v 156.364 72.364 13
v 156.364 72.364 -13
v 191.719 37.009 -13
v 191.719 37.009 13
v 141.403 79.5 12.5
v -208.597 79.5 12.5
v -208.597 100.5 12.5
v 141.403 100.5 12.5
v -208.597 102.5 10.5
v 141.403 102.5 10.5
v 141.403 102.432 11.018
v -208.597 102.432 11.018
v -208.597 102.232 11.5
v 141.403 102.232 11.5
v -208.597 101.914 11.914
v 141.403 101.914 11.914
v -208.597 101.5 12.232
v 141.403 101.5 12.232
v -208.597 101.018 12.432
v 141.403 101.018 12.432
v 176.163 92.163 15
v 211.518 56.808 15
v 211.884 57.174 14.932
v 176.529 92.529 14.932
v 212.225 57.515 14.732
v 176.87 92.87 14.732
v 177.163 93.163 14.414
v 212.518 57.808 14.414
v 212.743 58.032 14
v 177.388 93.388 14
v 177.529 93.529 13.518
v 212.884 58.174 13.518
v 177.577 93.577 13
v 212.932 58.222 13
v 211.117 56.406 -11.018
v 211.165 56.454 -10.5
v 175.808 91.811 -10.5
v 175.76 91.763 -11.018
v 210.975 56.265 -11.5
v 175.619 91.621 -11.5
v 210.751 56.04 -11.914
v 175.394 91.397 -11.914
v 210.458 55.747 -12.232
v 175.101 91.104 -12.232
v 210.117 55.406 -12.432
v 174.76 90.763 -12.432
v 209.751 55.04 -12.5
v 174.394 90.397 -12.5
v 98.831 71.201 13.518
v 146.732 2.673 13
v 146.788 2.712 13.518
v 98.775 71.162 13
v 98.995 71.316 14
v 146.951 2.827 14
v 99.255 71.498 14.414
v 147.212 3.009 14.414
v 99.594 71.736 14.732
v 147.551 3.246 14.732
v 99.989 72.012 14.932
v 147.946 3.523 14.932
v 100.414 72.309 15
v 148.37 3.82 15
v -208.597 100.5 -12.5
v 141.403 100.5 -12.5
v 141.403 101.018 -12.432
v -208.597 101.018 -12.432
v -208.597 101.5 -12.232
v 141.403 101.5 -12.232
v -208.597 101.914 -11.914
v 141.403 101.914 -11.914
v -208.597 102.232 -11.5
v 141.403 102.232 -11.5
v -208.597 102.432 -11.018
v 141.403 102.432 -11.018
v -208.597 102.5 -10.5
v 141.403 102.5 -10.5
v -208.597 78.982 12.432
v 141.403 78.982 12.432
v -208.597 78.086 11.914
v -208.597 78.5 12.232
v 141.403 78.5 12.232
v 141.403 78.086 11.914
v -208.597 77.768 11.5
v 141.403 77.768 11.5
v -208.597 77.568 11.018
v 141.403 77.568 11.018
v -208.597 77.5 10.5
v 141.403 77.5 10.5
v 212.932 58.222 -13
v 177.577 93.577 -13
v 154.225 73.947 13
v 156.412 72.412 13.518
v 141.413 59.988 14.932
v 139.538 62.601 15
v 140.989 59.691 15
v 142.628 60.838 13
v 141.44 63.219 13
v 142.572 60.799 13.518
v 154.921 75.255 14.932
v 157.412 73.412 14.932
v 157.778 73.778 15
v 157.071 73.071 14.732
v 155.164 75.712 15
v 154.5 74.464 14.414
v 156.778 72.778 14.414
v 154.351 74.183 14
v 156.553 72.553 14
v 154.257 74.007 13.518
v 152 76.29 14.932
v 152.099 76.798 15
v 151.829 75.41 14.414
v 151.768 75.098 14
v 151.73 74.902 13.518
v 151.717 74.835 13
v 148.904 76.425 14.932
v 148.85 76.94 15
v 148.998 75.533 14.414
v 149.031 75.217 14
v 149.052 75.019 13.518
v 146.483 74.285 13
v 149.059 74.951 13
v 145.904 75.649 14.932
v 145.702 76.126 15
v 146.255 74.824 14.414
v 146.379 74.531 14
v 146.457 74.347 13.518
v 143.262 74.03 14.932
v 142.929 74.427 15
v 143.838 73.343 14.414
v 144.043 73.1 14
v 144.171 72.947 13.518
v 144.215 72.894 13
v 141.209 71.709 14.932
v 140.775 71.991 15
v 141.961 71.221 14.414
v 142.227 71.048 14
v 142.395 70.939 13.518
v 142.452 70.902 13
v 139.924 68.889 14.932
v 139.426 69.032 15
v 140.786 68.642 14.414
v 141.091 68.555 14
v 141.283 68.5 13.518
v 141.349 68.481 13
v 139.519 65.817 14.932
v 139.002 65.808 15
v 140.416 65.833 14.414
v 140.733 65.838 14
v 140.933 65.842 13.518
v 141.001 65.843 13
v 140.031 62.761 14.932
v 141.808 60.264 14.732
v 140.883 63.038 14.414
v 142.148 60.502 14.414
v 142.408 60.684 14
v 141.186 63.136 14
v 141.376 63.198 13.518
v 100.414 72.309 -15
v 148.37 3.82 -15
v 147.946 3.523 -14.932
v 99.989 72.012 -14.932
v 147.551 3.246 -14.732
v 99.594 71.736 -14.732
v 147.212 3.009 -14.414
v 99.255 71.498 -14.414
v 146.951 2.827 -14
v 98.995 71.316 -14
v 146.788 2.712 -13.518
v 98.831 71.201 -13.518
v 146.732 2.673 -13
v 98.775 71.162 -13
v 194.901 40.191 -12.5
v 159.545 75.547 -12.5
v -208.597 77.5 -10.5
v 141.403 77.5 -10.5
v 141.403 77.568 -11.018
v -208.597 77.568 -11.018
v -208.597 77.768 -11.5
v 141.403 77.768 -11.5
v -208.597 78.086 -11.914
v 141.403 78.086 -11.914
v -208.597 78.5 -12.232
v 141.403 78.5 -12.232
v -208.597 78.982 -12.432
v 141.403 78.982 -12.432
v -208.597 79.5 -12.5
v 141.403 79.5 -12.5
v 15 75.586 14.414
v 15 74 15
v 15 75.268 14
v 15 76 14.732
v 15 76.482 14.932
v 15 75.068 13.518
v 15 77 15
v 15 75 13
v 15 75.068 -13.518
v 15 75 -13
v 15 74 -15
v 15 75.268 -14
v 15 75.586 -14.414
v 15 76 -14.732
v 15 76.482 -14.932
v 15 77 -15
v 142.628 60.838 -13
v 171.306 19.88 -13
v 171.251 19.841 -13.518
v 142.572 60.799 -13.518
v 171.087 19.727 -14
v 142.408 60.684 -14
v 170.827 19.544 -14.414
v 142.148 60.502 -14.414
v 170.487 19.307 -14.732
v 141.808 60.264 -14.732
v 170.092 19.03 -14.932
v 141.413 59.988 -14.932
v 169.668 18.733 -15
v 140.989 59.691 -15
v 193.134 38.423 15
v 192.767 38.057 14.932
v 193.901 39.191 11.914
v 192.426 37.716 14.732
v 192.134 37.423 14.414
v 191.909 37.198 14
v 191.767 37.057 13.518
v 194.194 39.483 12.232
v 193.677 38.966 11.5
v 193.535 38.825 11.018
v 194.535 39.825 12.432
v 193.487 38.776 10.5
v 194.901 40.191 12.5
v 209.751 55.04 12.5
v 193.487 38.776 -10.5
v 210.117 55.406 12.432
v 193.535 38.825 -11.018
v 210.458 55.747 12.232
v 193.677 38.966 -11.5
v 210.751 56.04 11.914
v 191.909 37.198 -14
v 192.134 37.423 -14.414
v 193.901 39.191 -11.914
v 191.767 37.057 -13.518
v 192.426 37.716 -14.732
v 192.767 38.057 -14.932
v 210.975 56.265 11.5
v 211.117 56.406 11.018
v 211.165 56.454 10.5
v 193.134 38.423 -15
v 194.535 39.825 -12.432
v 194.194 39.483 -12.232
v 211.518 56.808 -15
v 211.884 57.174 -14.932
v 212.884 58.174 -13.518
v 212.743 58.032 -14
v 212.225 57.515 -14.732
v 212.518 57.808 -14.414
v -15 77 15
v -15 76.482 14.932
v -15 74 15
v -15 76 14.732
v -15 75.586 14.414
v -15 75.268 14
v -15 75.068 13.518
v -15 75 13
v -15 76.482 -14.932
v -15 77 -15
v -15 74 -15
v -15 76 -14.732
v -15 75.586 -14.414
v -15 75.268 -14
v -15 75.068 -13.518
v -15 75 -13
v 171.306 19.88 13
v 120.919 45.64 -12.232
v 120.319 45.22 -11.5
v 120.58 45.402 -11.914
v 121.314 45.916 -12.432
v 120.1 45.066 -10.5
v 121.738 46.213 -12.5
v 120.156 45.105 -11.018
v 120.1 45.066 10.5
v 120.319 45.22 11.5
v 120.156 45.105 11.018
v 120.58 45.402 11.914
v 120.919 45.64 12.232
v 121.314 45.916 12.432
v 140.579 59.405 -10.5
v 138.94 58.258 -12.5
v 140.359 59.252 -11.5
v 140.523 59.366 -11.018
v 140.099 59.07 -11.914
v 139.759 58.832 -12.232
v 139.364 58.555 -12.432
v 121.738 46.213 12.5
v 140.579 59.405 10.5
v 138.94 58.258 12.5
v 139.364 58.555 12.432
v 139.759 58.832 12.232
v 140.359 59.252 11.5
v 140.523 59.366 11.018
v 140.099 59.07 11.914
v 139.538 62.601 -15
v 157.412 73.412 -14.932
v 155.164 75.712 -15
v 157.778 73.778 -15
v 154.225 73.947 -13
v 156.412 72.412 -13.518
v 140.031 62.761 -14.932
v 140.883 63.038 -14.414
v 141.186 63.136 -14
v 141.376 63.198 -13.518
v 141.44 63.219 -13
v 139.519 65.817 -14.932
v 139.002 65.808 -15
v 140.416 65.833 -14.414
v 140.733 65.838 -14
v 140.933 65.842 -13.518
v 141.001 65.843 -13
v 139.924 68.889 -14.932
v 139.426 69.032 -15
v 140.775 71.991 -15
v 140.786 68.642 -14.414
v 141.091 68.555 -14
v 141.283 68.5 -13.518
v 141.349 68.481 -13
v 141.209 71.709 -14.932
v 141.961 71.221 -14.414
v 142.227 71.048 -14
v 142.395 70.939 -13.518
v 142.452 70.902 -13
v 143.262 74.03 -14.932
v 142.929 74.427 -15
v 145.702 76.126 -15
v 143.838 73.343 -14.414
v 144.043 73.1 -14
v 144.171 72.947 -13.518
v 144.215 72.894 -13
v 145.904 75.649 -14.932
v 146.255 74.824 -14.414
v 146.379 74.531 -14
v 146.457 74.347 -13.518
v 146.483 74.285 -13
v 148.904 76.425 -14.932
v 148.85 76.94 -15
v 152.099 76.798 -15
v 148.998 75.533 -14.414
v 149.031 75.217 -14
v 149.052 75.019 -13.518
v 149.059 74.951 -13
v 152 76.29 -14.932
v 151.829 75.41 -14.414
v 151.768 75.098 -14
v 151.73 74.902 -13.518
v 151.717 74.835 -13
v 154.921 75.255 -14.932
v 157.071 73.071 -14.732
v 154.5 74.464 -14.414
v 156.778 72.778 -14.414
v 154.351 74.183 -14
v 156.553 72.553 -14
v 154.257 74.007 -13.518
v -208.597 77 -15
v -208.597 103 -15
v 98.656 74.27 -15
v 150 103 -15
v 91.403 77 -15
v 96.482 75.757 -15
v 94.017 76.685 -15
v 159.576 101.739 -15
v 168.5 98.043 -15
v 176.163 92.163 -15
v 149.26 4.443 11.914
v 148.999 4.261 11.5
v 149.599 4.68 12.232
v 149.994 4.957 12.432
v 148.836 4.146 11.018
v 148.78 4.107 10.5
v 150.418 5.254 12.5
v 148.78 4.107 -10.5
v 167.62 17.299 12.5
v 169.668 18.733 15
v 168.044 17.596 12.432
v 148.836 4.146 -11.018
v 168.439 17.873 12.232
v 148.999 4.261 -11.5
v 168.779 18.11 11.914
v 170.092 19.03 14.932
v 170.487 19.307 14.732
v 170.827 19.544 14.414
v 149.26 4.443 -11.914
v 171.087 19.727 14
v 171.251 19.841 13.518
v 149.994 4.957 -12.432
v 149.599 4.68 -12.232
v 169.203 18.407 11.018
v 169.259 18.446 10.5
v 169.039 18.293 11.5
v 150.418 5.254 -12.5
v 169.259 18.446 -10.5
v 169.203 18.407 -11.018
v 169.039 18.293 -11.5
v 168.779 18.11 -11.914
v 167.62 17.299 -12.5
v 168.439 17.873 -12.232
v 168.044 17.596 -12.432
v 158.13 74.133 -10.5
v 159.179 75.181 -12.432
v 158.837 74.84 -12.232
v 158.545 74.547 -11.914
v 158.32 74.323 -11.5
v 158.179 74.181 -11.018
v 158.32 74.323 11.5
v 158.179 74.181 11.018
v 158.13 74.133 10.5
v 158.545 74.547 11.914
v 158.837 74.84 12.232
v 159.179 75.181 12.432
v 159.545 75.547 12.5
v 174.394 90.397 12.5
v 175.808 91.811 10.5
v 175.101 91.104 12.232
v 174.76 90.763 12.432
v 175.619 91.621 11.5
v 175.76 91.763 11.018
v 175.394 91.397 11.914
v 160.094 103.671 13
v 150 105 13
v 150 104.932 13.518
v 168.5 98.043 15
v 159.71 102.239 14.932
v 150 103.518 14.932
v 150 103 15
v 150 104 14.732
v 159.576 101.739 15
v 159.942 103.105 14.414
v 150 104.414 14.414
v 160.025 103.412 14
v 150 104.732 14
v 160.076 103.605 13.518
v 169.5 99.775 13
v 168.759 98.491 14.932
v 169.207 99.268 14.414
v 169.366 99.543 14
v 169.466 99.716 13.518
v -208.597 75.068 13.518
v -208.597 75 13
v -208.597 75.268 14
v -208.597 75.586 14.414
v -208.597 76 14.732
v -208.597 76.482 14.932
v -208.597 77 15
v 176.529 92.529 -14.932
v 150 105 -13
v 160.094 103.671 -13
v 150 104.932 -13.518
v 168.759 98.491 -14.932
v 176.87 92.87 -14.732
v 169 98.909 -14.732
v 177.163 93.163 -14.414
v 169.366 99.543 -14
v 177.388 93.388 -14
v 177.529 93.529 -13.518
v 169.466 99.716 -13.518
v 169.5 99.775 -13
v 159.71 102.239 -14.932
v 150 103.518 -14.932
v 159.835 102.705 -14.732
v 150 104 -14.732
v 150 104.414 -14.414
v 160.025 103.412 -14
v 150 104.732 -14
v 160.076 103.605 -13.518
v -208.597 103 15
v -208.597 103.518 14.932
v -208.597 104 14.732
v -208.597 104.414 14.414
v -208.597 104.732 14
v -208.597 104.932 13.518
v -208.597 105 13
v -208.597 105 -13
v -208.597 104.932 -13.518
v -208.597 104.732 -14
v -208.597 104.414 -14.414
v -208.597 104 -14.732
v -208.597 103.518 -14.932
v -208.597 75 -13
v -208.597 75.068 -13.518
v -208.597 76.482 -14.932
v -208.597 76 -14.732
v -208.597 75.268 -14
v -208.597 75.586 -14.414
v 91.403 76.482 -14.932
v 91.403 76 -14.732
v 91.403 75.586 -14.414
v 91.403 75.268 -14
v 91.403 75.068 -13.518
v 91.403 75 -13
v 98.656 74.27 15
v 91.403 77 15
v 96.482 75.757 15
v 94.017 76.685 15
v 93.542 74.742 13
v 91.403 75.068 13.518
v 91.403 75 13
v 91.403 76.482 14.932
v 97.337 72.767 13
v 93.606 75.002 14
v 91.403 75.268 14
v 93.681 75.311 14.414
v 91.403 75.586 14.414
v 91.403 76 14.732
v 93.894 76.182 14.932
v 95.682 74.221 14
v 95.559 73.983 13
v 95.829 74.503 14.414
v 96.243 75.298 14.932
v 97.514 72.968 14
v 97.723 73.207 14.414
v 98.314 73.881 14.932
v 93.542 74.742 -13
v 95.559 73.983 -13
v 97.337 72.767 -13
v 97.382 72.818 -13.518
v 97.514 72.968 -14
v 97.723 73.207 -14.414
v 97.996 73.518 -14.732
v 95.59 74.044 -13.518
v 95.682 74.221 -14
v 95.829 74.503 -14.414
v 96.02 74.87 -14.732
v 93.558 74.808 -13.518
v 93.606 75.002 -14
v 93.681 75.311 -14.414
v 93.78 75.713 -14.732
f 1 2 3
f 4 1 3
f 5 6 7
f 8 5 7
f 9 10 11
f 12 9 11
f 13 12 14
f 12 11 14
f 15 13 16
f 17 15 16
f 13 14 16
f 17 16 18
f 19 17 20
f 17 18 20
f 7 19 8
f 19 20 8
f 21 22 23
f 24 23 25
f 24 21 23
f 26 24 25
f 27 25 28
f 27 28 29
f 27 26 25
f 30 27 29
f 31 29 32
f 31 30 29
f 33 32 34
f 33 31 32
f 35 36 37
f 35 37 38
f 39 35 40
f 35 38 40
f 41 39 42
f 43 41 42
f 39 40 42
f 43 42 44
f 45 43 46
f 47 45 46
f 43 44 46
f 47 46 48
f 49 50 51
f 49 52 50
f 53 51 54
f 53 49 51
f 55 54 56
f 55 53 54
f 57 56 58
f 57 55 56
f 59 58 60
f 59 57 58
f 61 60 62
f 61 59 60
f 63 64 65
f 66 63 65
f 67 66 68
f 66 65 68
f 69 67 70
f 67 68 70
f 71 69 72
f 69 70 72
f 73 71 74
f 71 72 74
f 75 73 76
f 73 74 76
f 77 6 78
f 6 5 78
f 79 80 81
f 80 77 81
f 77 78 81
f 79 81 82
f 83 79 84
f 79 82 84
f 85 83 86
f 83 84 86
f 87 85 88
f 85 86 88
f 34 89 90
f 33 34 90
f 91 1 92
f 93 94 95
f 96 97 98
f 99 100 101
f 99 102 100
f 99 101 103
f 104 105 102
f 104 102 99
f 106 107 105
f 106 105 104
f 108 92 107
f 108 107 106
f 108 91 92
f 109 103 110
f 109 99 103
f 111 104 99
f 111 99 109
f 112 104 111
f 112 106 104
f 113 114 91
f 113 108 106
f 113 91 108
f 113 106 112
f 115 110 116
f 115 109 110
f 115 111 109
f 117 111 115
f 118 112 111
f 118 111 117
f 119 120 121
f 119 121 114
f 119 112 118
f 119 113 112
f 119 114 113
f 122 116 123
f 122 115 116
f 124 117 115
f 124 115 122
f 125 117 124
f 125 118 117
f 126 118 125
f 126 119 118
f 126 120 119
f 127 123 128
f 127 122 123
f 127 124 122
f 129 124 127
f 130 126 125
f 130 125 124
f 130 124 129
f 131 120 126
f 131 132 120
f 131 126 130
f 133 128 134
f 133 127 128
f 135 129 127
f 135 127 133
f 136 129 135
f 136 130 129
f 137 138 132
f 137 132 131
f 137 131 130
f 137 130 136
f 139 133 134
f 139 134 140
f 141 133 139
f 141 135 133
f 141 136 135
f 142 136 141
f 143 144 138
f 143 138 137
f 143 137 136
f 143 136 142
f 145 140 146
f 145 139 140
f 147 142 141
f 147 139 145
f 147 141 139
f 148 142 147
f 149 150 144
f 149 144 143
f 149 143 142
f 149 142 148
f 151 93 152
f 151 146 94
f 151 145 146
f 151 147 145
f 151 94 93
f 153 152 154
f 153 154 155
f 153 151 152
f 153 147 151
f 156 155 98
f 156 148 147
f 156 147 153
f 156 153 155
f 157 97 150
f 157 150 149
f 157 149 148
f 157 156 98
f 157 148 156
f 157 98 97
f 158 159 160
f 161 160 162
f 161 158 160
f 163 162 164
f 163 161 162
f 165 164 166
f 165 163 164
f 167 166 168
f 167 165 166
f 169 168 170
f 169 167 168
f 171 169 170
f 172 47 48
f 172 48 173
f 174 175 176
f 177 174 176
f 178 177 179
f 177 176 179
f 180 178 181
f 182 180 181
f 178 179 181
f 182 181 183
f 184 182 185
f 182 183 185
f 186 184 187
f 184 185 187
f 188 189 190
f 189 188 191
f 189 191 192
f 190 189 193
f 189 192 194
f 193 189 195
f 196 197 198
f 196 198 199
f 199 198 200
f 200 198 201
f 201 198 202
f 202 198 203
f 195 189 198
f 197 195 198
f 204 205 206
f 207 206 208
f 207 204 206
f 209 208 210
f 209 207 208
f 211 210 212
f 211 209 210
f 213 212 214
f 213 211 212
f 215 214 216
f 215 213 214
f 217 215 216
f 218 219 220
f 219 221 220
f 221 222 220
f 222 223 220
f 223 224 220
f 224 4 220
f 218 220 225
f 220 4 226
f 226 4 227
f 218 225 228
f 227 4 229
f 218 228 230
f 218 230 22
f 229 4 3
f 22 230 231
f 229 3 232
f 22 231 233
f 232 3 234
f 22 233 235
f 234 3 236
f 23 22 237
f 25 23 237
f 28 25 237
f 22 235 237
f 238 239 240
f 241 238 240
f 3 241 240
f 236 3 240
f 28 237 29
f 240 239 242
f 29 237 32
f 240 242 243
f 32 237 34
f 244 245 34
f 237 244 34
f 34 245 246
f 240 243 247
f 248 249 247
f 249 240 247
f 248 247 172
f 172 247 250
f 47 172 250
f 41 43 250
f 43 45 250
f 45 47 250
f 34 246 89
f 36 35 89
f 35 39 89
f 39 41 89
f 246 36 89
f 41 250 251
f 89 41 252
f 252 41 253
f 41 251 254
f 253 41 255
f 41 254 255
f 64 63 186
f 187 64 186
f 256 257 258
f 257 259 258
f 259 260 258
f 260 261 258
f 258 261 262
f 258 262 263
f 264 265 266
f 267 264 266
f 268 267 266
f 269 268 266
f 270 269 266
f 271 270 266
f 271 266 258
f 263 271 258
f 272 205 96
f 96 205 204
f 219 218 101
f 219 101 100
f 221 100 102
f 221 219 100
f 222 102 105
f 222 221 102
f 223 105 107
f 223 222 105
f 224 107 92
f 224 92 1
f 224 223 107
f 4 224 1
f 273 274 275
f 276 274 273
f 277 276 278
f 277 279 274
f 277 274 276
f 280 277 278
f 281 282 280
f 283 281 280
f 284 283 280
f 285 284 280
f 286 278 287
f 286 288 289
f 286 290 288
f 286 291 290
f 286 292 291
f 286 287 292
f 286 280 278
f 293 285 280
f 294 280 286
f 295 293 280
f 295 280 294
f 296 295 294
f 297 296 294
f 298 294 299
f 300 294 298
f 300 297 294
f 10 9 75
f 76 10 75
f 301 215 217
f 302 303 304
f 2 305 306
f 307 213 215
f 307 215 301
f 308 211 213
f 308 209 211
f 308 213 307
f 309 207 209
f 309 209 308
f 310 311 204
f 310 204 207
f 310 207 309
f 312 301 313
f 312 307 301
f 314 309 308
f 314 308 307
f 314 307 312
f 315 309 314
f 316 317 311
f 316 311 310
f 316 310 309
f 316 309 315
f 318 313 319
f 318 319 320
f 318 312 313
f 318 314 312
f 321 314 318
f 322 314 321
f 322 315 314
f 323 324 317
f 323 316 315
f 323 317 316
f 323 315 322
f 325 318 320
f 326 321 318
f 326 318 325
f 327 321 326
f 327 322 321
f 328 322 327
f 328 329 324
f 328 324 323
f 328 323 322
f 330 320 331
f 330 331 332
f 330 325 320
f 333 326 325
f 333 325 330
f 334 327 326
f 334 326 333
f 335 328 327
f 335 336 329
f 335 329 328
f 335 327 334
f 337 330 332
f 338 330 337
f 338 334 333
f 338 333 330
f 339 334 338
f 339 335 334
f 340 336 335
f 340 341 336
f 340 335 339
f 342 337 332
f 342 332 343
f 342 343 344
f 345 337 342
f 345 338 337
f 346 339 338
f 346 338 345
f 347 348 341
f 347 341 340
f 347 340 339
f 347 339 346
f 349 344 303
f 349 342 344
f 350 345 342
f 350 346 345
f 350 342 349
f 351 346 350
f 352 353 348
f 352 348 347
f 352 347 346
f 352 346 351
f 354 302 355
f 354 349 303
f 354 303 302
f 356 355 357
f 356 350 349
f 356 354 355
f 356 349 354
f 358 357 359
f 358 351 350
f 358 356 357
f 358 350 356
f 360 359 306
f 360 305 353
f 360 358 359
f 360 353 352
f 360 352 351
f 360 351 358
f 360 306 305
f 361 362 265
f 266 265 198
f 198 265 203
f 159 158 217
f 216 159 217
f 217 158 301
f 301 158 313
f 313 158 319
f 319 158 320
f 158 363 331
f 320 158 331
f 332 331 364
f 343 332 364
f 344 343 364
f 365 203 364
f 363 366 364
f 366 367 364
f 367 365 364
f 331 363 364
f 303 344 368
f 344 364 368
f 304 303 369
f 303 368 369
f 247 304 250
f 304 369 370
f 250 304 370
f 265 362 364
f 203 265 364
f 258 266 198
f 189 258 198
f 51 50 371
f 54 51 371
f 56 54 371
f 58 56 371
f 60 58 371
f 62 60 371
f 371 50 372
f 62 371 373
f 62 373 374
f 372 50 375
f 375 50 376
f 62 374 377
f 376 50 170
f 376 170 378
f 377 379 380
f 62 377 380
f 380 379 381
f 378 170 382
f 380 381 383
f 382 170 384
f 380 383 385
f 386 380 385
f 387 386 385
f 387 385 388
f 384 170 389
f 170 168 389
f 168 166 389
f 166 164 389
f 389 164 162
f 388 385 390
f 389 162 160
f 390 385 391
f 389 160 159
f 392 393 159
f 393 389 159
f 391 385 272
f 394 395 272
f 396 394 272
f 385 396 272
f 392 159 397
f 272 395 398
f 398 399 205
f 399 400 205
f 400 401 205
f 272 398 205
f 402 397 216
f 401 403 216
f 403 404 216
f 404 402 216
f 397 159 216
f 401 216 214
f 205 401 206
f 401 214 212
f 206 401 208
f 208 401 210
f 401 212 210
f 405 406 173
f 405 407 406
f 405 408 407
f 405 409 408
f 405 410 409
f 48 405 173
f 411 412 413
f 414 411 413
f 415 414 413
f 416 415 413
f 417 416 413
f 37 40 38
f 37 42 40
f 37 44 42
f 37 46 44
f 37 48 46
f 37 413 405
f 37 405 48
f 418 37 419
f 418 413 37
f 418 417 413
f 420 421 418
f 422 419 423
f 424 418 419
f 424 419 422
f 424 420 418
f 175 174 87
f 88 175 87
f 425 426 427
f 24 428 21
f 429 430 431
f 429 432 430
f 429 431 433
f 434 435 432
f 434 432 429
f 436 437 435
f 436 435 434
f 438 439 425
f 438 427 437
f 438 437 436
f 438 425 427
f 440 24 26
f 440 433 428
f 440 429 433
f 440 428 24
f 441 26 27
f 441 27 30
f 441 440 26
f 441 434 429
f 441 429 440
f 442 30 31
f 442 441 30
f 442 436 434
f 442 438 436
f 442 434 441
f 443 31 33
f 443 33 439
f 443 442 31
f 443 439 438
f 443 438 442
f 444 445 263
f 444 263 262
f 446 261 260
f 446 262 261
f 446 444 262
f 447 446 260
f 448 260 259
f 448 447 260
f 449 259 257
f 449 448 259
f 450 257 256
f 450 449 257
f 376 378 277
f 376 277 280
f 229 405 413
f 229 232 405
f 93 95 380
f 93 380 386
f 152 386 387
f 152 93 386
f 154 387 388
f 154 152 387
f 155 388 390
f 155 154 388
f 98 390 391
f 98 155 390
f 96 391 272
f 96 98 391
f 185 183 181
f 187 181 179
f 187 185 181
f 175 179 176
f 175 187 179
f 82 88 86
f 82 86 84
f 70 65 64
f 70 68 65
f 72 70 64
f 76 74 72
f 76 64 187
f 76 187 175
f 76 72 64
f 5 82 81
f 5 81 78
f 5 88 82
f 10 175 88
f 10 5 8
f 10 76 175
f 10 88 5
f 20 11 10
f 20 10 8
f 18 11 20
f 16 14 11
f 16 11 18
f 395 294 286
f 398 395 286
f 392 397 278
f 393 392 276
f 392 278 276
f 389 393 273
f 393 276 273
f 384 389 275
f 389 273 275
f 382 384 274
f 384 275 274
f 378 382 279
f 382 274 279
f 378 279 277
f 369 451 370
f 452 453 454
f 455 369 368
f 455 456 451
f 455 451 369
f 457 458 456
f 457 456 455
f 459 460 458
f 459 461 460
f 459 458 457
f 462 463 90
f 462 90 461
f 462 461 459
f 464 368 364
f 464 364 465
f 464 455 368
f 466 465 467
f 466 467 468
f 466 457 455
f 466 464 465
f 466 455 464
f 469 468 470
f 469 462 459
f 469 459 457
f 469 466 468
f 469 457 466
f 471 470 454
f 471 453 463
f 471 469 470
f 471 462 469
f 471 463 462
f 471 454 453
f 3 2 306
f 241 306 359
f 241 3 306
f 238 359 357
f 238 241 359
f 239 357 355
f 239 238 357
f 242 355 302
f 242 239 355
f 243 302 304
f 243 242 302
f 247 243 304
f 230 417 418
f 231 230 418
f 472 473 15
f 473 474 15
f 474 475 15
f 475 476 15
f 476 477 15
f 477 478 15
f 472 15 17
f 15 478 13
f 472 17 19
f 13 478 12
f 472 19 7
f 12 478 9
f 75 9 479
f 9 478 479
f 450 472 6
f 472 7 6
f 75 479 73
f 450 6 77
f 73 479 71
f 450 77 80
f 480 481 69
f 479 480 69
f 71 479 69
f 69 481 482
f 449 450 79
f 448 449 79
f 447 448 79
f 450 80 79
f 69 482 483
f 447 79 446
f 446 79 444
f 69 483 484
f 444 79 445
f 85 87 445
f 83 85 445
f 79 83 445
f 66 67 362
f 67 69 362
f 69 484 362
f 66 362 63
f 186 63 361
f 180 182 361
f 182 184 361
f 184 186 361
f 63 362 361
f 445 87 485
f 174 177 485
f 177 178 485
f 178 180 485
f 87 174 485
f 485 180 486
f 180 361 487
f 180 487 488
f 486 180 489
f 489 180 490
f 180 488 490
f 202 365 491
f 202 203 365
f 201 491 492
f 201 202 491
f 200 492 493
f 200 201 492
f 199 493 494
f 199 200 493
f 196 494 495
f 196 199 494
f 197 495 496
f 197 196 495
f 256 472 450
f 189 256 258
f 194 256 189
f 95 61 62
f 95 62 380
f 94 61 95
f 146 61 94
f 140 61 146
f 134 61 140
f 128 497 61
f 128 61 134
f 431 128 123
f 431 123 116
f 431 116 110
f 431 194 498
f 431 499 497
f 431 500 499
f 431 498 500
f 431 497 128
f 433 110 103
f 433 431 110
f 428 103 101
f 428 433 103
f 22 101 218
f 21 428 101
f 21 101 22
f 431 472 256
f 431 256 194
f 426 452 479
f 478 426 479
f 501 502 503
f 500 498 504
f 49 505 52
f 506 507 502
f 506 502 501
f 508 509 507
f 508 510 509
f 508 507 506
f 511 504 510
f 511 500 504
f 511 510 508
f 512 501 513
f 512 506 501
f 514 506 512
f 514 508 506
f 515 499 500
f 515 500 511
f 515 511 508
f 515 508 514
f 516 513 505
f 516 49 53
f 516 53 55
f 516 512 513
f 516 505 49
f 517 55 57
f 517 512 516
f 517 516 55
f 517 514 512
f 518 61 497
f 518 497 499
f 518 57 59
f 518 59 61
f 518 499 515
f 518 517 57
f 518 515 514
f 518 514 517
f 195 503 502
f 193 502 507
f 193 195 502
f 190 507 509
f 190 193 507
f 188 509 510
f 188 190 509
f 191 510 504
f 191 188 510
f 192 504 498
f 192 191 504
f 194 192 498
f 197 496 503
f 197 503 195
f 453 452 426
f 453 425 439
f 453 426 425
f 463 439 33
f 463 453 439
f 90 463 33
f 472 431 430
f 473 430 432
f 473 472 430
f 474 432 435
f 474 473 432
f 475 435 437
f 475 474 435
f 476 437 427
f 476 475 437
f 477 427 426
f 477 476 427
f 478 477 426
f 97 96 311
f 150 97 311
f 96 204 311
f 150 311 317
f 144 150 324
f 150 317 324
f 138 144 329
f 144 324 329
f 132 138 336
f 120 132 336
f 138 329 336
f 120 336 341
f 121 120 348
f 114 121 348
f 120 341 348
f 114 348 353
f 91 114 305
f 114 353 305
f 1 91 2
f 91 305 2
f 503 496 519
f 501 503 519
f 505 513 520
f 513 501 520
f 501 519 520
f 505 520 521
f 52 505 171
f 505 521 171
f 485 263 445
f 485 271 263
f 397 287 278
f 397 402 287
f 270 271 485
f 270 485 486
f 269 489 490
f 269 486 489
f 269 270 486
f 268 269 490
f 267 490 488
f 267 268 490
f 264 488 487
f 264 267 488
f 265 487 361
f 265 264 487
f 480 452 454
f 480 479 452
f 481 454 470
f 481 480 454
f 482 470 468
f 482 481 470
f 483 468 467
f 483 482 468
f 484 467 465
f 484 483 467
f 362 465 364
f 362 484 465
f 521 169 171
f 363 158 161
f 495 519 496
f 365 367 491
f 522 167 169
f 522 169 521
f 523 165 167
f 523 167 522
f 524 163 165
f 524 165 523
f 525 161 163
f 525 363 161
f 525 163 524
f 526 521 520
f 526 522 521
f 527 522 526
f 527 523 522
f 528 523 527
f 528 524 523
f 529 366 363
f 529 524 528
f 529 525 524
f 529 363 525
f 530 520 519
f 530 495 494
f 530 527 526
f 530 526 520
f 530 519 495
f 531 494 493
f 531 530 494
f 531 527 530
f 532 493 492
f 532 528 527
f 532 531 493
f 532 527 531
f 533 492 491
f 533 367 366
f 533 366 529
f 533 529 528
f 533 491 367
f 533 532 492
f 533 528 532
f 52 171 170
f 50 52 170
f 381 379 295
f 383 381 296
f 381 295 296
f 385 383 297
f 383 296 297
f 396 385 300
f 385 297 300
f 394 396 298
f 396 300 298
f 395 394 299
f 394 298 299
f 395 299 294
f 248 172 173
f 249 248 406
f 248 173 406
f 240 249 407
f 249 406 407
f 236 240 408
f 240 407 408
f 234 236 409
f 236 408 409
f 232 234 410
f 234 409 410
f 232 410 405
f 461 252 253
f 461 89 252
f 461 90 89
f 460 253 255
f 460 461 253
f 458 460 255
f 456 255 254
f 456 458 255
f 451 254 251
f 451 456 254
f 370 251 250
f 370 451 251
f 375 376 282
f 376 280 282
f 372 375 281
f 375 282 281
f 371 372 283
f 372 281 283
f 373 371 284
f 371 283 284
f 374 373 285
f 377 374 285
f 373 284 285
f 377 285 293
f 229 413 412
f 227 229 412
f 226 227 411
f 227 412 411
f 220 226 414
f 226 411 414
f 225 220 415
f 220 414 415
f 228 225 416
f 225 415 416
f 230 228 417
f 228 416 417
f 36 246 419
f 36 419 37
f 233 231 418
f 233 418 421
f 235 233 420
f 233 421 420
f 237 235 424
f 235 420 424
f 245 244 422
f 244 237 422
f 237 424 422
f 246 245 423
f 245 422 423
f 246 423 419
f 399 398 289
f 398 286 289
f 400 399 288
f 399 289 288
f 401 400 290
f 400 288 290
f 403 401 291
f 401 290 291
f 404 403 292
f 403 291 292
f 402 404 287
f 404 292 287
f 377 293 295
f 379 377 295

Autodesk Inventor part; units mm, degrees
ref_plane "YZ Plane" through (0, 0, 0) normal (1, 0, 0) x (0, 1, 0)
ref_plane "XZ Plane" through (0, 0, 0) normal (0, 1, 0) x (-1, 0, 0)
ref_plane "XY Plane" through (0, 0, 0) normal (0, 0, 1) x (1, 0, 0)
sketch "Sketch1" plane through (0, 0, 0) normal (0, 0, 1) x (1, 0, 0)
  line L0 (98.7752, 71.1622) -> (146.7319, 2.6729)
  line L1 (146.7319, 2.6729) -> (171.3065, 19.8802)
  line L2 (171.3065, 19.8802) -> (142.6276, 60.8378)
  arc A0 (156.364, 72.364) -> (142.6276, 60.8378) centre (150, 66) ccw
  line L3 (156.364, 72.364) -> (191.7193, 37.0086)
  line L4 (191.7193, 37.0086) -> (212.9325, 58.2218)
  line L5 (212.9325, 58.2218) -> (177.5772, 93.5772)
  arc A1 (177.5772, 93.5772) -> (150, 105) centre (150, 66) ccw
  line L6 (91.4028, 75) -> (-208.5972, 75)
  line L7 (150, 105) -> (-208.5972, 105)
  line L8 (-208.5972, 105) -> (-208.5972, 75)
  line L9 (0, 128.7567) -> (0, -18.341) projected
  line L10 (-292.9031, 0) -> (297.2384, 0) projected
  arc A2 (98.7752, 71.1622) -> (91.4028, 75) centre (91.4028, 66) ccw
  dimension "d38" = 30
  dimension "d39" = 30
  dimension "d40" = 9
  dimension "d47" = 30
  dimension "d53" = 9
  dimension "d56" = 300
  dimension "d58" = 150
  dimension "d59" = 50
  dimension "d60" = 35
  dimension "d61" = 75
  dimension "d88" = 45
extrude "Extrusion1" add sketch "Sketch1" along normal mid plane 30
sketch "Sketch4" plane through (0, 0, 0) normal (0, 0, 1) x (1, 0, 0)
  line L0 (-208.5972, 75) -> (91.4028, 75) projected
  line L1 (-15, 75) -> (15, 75)
  line L2 (-15, 75) -> (-15, 74)
  line L3 (-15, 74) -> (15, 74)
  line L4 (15, 74) -> (15, 75)
  line L5 (0, 90) -> (0, -15) projected
  point P0 (0, 0)
  dimension "d62" = 30
  dimension "d63" = 15
  dimension "d64" = 1
extrude "Extrusion4" add sketch "Sketch4" along normal mid plane 30
fillet "Fillet1" radius 2 14 edges at (-111.7986, 75, 15) (95.5586, 73.9831, 15) (122.7535, 36.9176, 15) (53.2014, 75, 15) (-111.7986, 75, -15) (95.5586, 73.9831, -15) (122.7535, 36.9176, -15) (53.2014, 75, -15) (164.9247, 102.0313, -15) (195.2548, 75.8995, -15) (-29.2986, 105, -15) (164.9247, 102.0313, 15) (195.2548, 75.8995, 15) (-29.2986, 105, 15)
sketch "Sketch5" plane through (-208.5972, 77, -15) normal (-1, 0, 0) x (0, 0, 1)
  line L0 (27.5, 25.5) -> (2.5, 25.5)
  line L1 (2.5, 25.5) -> (2.5, 0.5)
  line L2 (2.5, 0.5) -> (27.5, 0.5)
  line L3 (27.5, 0.5) -> (27.5, 25.5)
  line L4 (2, 28) -> (28, 28) projected
  line L5 (0, 0) -> (0, 26) projected
  line L6 (2, -2) -> (28, -2) projected
  line L7 (30, 26) -> (30, 0) projected
  point P0 (15, -77)
  dimension "d68" = 2.5
  dimension "d69" = 2.5
  dimension "d70" = 2.5
  dimension "d71" = 2.5
extrude "Extrusion5" cut sketch "Sketch5" against normal blind 350
fillet "Fillet2" radius 2 4 edges at (-33.5972, 77.5, 12.5) (-33.5972, 77.5, -12.5) (-33.5972, 102.5, -12.5) (-33.5972, 102.5, 12.5)
sketch "Sketch6" plane through (191.7193, 37.0086, -15) normal (0.7071, -0.7071, 0) x (0.7071, 0.7071, 0)
  line L0 (2.5, 27.5) -> (27.5, 27.5)
  line L1 (27.5, 27.5) -> (27.5, 2.5)
  line L2 (27.5, 2.5) -> (2.5, 2.5)
  line L3 (2.5, 2.5) -> (2.5, 27.5)
  line L4 (28, 0) -> (0, 0) projected
  line L5 (30, 2) -> (30, 28) projected
  line L6 (0, 30) -> (28, 30) projected
  line L7 (0, 0) -> (0, 30) projected
  point P0 (-161.7351, 15)
  dimension "d75" = 2.5
  dimension "d76" = 2.5
  dimension "d77" = 2.5
  dimension "d78" = 2.5
extrude "Extrusion6" cut sketch "Sketch6" against normal blind 50
sketch "Sketch7" plane through (171.3065, 19.8802, -15) normal (0.5736, -0.8192, 0) x (0.8192, 0.5736, 0)
  line L0 (-27.5, 27.5) -> (-2.5, 27.5)
  line L1 (-2.5, 27.5) -> (-2.5, 2.5)
  line L2 (-2.5, 2.5) -> (-27.5, 2.5)
  line L3 (-27.5, 2.5) -> (-27.5, 27.5)
  line L4 (-28, 30) -> (0, 30) projected
  line L5 (0, 30) -> (0, 0) projected
  line L6 (0, 0) -> (-28, 0) projected
  line L7 (-30, 2) -> (-30, 28) projected
  point P0 (-151.7289, 15)
  dimension "d81" = 2.5
  dimension "d82" = 2.5
  dimension "d83" = 2.5
  dimension "d84" = 2.5
extrude "Extrusion7" cut sketch "Sketch7" against normal blind 50
fillet "Fillet3" radius 2 14 edges at (174.0416, 54.6863, 15) (156.967, 40.359, 15) (144.2149, 72.8944, 15) (156.967, 40.359, -15) (174.0416, 54.6863, -15) (144.2149, 72.8944, -15) (134.4404, 24.5857, -12.5) (134.4404, 24.5857, 12.5) (154.9192, 38.9251, 12.5) (154.9192, 38.9251, -12.5) (175.8094, 56.4541, -12.5) (193.4871, 74.1317, -12.5) (193.4871, 74.1317, 12.5) (175.8094, 56.4541, 12.5)
equation "\"d39\" = d38"
equation "\"secure_arm_radii\" = 9"
equation "\"rack_tooth_thickness\" = 5"
equation "\"rack_tooth_addendum\" = 5"
equation "\"rack_tooth_dedendum\" = 5"
equation "\"hoop_width_large\" = 51"
equation "\"hoop_thickness_large\" = 4"
equation "\"hoop_width_medium\" = 33.7"
equation "\"hoop_thickness_medium\" = 3.2"
equation "\"hoop_width_small\" = 25.4"
equation "\"hoop_thickness_small\" = 2"
equation "\"hoop_bearing_length\" = 5deg"
equation "\"secure_arm_angle\" = 35deg"
equation "\"hoop_tabs_thickness\" = 6"
equation "\"hoop_tabs_hole\" = 12"
equation "\"support_baseClamp_thickness\" = 8"
equation "\"support_frame_endHoleBuffer\" = 45"
equation "\"support_frame_squareBarThickness\" = 5"
equation "\"support_baseClamp_sleeveSweepTerminationAngle\" = 55deg"
equation "\"support_baseClamp_sleeveHoleDiameter\" = 12"
equation "\"support_frame_squareBarFillet\" = 2"
equation "\"support_baseClamp_platformWidthBuffer\" = 0"
equation "\"support_baseClamp_platformThickness\" = 15"
equation "\"support_baseClamp_platformLengthBuffer\" = 35"
equation "\"hoop_angle_z\" = 45deg"
equation "\"hoop_cable_diam\" = 5"
equation "\"hoop_cable_pulley_diam\" = 22"
equation "\"wheelchair_deployed_width\" = 635"
equation "\"wheelchair_deployed_height\" = 914"
equation "\"wheelchair_deployed_length\" = 1067"
equation "\"sm_varx_pinPlate_thickness\" = 5"
equation "\"sm_varx_member_tolerance\" = 0"
equation "\"sm_varx_pinPlate_holeDiameter\" = 5"
equation "\"sm_varx_squareBarThickness\" = 2.5"
equation "\"hoop_bushing23_radialInterference\" = 0"
equation "\"hoop_bushing12_radialInterference\" = 0"
equation "\"hoop_bushing12_od\" = 43"
equation "\"hoop_bushing23_od\" = 27.3"
equation "\"wheelchatir_pos_deploy_angle_0\" = 65deg"
equation "\"wheelchatir_pos_store_angle_0\" = 90deg"
equation "\"wheelchatir_pos_deploy_angle_1\" = 20deg"
equation "\"wheelchatir_pos_store_angle_1\" = 20deg"
equation "\"hoop_bushing12_thickness\" = 9.3"
equation "\"hoop_bushing23_thickness\" = 1.9"
properties part number "grip_N_fix"
